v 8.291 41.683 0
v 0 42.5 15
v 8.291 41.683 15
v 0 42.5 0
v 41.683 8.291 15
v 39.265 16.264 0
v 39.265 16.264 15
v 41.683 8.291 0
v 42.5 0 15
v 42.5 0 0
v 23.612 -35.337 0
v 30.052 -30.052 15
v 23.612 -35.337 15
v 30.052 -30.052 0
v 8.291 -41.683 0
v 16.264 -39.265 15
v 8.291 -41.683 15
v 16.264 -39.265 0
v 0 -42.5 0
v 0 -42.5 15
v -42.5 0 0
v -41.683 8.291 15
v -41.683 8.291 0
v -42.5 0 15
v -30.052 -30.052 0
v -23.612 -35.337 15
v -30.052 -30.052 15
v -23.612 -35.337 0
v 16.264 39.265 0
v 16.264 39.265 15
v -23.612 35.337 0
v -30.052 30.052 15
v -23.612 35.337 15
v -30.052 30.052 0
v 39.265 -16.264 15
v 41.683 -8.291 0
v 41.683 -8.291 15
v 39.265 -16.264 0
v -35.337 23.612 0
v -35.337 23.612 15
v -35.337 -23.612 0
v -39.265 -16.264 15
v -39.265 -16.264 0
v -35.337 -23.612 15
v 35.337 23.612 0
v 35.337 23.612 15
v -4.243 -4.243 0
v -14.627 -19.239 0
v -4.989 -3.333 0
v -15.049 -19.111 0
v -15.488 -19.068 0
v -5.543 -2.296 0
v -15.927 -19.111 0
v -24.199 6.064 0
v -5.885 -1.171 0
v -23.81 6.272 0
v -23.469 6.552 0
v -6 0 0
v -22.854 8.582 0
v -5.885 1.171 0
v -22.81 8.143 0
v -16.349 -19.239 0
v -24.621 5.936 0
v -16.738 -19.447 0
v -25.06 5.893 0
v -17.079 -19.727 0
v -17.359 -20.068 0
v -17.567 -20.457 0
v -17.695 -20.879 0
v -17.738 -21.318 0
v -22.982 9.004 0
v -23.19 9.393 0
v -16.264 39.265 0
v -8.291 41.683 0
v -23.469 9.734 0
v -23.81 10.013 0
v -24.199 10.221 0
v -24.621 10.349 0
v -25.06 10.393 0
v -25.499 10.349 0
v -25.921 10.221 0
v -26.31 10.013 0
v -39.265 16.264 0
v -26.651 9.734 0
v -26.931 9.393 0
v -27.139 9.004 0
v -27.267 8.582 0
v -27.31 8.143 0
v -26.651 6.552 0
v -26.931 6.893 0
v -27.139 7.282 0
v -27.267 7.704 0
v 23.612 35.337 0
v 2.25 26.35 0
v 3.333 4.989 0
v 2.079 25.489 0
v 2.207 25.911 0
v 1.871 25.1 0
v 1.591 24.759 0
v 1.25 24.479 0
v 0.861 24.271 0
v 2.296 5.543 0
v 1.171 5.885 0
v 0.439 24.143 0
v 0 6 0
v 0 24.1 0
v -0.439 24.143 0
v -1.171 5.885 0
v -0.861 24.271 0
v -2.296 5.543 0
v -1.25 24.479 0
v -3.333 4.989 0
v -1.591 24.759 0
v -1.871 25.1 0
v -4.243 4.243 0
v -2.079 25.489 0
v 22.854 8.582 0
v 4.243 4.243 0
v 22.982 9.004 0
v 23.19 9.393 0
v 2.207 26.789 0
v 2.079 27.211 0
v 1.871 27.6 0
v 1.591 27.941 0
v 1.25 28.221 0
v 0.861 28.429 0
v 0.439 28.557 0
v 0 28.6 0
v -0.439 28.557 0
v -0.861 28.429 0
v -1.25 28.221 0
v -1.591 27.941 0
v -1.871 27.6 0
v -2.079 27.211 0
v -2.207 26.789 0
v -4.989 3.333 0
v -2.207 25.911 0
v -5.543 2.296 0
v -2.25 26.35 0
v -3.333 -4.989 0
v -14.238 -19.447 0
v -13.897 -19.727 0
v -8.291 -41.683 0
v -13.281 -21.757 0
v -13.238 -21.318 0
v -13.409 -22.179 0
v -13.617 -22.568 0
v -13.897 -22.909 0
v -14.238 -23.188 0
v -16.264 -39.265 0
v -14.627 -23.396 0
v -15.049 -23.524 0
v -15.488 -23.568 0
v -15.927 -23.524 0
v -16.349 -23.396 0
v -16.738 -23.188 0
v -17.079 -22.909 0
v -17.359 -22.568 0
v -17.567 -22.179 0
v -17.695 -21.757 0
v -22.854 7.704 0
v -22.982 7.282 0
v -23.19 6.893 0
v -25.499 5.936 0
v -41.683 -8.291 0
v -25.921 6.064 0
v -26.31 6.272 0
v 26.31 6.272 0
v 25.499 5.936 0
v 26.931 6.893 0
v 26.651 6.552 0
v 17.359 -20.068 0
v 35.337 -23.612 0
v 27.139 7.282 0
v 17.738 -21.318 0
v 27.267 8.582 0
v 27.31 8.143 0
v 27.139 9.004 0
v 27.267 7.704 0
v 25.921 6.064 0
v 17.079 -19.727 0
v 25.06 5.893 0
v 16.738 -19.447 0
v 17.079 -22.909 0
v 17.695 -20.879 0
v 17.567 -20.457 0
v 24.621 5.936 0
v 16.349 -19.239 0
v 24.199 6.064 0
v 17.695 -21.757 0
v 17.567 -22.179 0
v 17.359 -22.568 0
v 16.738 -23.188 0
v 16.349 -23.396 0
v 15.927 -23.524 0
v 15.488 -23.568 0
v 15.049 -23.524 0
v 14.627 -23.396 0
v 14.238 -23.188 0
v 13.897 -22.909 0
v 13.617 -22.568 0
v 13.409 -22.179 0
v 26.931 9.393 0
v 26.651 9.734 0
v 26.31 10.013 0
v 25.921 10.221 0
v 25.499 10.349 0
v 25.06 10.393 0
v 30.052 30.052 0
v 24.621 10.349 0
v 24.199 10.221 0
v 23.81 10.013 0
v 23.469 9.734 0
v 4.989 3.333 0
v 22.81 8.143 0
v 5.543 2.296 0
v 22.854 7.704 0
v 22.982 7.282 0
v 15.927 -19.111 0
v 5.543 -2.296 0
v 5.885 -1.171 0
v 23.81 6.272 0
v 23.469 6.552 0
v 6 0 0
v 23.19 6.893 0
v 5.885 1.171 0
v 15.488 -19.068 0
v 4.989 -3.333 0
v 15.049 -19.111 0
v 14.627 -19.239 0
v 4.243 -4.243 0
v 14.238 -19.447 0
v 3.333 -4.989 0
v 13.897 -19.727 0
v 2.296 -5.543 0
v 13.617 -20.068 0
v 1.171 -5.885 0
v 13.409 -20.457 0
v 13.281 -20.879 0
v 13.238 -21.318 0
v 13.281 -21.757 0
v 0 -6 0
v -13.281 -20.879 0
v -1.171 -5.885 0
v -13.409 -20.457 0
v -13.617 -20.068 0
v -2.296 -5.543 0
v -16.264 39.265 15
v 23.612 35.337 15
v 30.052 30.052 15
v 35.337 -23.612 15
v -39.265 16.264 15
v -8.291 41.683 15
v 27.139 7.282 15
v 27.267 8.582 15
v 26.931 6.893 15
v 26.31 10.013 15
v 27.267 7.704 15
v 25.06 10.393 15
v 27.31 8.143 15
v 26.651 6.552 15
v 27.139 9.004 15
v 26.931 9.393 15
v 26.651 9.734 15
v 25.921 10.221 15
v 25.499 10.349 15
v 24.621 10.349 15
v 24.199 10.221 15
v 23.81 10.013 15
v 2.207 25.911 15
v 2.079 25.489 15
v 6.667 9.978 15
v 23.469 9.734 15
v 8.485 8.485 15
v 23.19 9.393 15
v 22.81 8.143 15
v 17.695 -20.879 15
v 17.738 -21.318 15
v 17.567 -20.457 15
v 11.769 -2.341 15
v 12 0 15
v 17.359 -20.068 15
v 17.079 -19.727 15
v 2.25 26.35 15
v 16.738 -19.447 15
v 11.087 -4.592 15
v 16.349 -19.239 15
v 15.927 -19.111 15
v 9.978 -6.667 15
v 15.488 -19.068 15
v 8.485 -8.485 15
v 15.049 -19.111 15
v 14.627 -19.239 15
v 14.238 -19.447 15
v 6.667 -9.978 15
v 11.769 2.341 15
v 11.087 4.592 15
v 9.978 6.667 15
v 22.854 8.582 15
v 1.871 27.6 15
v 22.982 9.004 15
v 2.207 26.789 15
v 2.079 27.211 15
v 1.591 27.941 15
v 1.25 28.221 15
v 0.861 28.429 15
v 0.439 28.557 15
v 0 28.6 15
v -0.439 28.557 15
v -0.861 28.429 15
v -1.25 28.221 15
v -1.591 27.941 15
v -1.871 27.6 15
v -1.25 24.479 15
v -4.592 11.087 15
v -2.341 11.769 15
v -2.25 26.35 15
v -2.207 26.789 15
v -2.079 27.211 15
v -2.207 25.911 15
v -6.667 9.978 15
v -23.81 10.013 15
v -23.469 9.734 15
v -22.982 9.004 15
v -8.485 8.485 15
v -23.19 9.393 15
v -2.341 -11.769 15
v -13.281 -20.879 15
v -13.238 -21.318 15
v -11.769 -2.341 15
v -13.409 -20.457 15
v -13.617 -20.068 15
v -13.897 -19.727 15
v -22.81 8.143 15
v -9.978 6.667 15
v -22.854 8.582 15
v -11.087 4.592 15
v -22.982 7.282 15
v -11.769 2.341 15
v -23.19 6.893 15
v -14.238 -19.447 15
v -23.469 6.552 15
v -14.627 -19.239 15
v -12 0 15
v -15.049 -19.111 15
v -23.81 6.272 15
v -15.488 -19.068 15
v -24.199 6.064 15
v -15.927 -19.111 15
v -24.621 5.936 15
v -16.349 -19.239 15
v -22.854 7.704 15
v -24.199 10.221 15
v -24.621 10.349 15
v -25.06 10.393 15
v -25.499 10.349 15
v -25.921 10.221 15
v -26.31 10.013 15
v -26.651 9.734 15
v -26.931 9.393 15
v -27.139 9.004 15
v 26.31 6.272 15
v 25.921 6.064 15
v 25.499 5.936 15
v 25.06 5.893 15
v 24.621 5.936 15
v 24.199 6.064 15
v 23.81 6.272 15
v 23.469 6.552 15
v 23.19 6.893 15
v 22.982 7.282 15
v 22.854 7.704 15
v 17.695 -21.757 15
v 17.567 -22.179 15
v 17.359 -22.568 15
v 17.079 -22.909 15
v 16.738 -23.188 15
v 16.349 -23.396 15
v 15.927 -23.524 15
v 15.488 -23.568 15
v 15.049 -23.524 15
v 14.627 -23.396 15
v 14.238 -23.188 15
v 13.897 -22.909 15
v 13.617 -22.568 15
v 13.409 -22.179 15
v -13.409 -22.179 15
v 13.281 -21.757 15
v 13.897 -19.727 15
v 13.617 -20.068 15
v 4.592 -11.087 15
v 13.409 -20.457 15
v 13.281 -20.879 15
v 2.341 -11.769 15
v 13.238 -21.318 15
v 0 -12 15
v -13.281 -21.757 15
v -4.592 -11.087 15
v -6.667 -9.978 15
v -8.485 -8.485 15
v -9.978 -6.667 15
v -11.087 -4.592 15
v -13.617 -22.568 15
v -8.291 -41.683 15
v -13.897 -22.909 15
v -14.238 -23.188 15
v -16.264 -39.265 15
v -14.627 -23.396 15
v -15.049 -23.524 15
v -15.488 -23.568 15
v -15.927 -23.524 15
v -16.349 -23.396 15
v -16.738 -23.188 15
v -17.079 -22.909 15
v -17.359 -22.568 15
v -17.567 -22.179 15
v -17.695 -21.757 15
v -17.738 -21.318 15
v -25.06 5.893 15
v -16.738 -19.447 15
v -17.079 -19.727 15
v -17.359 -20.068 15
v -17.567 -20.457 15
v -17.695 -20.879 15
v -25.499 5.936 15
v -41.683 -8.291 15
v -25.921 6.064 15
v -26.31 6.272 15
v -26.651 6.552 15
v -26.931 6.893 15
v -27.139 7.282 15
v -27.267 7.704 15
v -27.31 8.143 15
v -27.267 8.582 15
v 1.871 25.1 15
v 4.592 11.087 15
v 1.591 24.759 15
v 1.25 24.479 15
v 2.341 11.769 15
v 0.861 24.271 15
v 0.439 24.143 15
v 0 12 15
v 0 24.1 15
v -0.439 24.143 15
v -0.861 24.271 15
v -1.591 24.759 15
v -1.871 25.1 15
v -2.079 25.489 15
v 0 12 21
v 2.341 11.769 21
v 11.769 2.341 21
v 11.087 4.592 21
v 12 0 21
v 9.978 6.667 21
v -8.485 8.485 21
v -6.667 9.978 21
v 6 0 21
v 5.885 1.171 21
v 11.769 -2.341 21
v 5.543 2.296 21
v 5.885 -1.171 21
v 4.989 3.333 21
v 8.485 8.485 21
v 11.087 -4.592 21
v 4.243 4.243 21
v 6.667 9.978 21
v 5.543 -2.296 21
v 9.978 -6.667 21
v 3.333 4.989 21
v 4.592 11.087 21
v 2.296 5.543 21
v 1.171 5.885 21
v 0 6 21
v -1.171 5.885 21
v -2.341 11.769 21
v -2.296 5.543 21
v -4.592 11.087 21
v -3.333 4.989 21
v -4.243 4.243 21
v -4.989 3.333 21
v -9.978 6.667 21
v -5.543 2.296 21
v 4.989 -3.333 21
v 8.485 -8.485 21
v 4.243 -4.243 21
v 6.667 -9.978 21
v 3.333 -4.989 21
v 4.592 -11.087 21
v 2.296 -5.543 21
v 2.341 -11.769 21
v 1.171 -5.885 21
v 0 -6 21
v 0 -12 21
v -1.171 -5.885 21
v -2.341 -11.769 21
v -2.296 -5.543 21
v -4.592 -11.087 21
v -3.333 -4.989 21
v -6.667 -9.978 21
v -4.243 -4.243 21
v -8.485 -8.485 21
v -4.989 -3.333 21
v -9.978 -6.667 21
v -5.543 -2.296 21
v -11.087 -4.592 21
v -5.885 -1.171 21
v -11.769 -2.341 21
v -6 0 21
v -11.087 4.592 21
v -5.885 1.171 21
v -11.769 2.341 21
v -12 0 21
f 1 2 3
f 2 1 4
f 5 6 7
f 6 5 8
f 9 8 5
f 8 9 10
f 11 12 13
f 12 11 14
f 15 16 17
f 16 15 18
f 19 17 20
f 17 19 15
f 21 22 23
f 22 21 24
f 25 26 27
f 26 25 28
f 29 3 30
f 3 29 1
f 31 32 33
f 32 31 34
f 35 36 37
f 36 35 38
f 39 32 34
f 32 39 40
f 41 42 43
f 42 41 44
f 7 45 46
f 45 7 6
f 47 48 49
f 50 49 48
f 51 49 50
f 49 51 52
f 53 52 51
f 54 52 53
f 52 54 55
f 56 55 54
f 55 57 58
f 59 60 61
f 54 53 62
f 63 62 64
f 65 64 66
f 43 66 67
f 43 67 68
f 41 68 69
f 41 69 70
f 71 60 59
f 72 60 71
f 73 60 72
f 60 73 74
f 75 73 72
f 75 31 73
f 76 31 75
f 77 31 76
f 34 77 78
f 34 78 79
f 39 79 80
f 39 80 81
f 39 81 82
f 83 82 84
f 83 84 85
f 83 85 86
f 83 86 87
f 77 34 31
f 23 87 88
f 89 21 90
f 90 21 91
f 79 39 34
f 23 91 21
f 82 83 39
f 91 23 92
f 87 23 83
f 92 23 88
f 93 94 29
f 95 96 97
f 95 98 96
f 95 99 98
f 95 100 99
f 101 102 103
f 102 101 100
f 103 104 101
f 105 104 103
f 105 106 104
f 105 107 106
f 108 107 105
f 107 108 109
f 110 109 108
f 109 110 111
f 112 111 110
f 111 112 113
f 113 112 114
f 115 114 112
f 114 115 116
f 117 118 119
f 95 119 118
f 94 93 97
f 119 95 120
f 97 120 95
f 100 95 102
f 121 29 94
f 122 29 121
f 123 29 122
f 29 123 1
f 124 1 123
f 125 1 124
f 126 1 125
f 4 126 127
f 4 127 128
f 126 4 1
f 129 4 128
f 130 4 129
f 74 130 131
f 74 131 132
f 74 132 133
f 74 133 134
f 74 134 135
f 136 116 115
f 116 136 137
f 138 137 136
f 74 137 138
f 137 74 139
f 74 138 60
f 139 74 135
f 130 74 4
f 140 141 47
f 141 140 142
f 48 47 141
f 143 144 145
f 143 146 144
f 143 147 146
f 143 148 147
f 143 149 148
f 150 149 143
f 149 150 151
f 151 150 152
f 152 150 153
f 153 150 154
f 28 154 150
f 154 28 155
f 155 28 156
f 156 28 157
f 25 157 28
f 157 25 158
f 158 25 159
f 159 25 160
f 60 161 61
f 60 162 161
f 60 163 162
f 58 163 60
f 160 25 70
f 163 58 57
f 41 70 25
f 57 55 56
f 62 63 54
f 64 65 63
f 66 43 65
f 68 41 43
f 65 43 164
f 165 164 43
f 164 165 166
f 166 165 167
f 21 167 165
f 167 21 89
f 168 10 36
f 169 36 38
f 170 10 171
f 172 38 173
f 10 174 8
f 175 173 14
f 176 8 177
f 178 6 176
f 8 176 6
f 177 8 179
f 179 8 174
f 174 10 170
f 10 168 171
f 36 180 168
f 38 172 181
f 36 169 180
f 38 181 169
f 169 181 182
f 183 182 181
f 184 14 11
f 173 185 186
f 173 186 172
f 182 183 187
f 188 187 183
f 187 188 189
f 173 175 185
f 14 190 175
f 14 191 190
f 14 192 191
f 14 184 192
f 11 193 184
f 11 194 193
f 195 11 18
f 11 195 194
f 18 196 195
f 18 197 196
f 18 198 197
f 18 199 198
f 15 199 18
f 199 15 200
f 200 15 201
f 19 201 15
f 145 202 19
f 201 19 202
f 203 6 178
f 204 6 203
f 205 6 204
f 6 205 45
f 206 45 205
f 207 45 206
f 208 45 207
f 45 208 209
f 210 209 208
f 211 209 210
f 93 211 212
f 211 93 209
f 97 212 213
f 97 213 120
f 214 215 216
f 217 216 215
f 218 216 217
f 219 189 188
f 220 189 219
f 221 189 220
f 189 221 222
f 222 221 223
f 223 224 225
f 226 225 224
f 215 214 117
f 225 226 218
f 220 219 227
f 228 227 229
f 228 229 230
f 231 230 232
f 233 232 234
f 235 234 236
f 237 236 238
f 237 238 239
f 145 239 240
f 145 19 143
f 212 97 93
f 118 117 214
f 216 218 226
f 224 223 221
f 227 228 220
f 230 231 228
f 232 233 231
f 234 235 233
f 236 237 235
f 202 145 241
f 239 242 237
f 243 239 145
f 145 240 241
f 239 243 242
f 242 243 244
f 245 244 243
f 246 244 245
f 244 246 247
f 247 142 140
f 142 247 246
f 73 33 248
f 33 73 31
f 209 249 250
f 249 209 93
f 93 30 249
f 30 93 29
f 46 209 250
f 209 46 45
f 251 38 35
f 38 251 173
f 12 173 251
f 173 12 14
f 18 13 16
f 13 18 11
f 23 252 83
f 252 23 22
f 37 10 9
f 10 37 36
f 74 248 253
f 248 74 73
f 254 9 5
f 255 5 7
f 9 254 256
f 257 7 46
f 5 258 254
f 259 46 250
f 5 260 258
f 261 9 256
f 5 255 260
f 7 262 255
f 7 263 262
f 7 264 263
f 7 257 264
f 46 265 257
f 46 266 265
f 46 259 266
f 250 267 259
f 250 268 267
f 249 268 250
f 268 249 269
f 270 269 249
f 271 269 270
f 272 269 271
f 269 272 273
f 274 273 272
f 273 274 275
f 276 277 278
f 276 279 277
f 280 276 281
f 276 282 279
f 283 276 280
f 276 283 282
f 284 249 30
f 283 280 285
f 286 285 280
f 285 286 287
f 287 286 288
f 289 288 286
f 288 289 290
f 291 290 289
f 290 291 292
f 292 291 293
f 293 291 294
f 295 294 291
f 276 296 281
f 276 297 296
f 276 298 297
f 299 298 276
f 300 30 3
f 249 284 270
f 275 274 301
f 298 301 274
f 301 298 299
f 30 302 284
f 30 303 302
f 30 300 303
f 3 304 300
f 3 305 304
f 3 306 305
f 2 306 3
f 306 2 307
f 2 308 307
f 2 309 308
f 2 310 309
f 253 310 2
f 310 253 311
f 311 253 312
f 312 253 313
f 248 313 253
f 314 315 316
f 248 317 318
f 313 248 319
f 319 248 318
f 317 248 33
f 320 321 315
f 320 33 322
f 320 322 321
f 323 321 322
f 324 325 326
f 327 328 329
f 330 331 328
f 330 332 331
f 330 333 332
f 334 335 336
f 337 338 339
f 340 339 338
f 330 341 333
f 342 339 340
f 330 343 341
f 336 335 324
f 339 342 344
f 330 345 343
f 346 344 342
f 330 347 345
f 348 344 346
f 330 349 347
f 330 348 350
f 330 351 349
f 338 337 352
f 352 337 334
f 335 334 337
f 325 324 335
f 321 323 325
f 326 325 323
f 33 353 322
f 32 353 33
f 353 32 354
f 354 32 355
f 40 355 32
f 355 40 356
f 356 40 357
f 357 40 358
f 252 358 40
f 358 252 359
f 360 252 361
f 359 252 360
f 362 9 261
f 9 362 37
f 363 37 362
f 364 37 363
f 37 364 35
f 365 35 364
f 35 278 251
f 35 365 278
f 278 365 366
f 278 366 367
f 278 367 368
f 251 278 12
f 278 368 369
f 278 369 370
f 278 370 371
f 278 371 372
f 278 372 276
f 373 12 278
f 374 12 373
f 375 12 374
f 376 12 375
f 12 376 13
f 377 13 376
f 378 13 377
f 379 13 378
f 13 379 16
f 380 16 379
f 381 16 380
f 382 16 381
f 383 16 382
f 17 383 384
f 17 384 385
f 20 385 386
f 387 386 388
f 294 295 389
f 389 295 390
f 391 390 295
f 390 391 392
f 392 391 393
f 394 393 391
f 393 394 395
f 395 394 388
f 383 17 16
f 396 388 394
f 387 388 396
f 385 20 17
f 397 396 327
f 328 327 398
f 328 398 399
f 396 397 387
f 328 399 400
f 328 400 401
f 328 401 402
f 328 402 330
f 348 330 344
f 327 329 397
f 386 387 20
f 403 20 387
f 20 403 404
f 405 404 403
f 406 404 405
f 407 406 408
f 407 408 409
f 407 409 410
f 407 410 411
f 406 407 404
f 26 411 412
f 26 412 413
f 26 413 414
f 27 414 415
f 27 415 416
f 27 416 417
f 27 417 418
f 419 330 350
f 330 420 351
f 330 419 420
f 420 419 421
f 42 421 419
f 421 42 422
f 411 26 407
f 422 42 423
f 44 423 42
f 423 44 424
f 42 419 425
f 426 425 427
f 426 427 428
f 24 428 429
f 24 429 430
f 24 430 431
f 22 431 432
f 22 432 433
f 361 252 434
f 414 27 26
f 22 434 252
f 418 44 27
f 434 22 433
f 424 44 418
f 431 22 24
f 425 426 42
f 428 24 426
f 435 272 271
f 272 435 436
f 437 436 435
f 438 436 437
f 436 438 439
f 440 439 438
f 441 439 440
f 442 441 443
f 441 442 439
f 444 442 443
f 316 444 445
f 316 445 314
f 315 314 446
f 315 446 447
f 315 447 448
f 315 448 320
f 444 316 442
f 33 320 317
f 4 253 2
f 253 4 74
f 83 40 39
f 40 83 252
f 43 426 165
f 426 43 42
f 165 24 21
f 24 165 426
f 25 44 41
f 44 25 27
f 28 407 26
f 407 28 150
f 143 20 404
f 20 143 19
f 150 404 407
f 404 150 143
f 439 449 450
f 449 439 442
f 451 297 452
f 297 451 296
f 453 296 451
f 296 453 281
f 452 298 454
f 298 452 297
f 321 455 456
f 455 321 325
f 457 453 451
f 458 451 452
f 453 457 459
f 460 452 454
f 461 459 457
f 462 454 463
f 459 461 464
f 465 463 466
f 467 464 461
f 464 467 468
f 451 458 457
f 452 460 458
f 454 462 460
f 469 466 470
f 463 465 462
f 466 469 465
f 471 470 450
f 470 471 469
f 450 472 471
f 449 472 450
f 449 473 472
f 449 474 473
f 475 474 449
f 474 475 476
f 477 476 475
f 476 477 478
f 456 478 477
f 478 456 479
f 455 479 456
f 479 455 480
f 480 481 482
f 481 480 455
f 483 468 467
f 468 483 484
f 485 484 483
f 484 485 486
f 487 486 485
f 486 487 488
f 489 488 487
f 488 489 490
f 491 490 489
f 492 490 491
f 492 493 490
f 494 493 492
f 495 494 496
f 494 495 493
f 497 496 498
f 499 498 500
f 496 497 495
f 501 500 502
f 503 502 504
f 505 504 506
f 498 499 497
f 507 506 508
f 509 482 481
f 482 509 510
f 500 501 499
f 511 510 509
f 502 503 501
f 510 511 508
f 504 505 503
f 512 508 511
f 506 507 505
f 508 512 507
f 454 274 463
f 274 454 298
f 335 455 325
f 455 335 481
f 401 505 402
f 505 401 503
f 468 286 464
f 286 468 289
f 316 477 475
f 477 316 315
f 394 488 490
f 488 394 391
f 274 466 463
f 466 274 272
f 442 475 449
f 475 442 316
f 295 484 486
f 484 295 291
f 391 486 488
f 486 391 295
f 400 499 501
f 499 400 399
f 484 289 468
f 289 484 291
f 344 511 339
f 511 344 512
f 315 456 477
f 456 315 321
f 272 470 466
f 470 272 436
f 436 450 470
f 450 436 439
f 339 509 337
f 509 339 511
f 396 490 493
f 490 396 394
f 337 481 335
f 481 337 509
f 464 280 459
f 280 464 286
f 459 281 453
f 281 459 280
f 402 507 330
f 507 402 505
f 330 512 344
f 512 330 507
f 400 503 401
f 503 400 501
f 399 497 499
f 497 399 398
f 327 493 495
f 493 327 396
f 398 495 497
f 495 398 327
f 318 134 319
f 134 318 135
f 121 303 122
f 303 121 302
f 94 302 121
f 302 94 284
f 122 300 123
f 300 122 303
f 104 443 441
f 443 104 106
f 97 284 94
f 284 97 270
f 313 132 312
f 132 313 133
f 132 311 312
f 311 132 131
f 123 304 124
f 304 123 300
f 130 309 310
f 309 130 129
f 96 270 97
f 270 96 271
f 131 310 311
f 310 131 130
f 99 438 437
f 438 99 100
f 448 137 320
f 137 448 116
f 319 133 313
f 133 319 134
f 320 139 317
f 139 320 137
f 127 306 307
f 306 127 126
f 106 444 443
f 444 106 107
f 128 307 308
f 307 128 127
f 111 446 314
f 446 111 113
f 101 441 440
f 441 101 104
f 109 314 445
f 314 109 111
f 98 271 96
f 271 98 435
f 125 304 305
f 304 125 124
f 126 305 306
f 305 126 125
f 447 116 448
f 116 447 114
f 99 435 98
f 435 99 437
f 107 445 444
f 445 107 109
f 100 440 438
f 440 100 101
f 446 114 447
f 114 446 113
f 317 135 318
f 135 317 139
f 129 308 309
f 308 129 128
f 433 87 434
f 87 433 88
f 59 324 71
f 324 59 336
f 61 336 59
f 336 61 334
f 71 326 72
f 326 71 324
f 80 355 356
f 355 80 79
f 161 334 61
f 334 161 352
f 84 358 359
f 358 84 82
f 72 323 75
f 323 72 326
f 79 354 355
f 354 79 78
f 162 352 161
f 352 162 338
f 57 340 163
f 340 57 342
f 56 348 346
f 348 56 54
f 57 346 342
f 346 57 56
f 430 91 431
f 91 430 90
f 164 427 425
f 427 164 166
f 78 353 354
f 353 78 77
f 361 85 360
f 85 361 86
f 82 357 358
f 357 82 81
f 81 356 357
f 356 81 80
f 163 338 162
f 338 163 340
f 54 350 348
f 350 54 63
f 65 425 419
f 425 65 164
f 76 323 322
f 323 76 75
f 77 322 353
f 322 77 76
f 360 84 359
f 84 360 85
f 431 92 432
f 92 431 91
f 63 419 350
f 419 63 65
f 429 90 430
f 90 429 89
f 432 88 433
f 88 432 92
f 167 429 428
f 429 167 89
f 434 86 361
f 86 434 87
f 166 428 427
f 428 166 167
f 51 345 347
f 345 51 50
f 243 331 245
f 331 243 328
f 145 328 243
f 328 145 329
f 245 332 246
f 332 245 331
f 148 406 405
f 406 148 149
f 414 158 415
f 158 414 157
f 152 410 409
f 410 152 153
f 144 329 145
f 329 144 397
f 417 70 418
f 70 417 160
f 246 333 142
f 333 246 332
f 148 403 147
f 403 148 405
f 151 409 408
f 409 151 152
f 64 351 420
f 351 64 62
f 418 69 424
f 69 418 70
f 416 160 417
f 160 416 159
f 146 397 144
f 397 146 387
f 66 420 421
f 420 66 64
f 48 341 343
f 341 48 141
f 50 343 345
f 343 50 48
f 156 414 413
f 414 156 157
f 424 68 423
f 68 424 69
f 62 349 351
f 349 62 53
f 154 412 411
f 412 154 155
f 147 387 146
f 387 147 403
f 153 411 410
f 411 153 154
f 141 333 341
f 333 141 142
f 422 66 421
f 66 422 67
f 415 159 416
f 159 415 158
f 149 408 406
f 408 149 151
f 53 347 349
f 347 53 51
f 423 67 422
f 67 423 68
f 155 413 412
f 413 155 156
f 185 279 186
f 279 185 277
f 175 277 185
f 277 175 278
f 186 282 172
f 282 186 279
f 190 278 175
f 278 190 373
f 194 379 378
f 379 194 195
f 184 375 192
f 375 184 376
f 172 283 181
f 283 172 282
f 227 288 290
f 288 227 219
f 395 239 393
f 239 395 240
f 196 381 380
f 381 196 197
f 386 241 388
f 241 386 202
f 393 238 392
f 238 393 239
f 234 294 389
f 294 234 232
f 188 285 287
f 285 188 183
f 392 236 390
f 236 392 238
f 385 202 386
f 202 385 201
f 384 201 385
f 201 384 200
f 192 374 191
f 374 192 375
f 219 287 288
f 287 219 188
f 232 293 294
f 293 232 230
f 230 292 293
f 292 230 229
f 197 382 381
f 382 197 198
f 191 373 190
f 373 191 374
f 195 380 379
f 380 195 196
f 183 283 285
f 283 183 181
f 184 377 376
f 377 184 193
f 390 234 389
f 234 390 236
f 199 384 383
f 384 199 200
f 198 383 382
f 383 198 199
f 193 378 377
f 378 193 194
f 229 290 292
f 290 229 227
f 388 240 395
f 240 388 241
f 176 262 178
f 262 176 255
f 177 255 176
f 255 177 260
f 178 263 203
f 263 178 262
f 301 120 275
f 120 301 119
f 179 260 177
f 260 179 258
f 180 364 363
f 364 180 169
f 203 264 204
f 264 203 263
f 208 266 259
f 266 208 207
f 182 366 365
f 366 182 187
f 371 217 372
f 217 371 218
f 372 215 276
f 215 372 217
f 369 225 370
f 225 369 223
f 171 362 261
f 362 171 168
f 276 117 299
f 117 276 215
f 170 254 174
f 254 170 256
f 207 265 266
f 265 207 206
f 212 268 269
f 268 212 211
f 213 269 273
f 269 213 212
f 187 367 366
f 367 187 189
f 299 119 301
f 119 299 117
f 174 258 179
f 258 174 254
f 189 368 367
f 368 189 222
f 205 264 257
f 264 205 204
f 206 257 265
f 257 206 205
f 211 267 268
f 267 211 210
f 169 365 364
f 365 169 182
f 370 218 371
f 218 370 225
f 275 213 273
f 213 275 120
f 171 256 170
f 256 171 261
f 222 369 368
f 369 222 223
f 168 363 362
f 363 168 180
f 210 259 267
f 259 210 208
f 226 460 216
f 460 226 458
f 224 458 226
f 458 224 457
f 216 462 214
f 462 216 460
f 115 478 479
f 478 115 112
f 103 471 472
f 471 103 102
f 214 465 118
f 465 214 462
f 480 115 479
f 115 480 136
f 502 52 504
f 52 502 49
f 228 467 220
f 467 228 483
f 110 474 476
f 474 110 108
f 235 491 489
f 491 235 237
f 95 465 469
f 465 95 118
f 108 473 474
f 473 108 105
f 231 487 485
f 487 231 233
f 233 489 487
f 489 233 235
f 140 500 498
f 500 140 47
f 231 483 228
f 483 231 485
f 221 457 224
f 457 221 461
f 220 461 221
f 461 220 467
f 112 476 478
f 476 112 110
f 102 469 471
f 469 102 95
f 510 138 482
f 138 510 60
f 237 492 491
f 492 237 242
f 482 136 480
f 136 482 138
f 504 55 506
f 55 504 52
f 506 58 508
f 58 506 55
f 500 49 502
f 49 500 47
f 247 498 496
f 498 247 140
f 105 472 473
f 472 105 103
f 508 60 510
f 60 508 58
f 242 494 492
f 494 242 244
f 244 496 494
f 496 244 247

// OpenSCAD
$fn = 32;

// ----------------------------------------------------------------------
// Flange Ø85 x 15
// 5 holes on a Ø52.7 bolt circle, bolted joints
// ----------------------------------------------------------------------

// --- parameters (mm) ---
flange_d = 85;   // outside diameter of the flange
thickness = 15;  // flange thickness
holes = 5;       // number of bolt holes
pcd = 52.7;      // bolt circle diameter
start_deg = 90;  // angle of the first hole, from +X
hole_d = 4.5;    // bolt hole diameter
bore_d = 12;     // central through bore
hub_d = 24;      // hub outside diameter
hub_h = 6;       // hub height above the flange face (0 = no hub)

// --- derived feature positions (mm) ---
height = thickness + hub_h;  // = 21   overall height of the part
pcd_r = pcd / 2;             // = 26.35   bolt circle radius
hole_step = 360 / holes;     // = 72   angular pitch
feature_centers = [
  [pcd_r * cos(start_deg + 0 * hole_step), pcd_r * sin(start_deg + 0 * hole_step)],
  [pcd_r * cos(start_deg + 1 * hole_step), pcd_r * sin(start_deg + 1 * hole_step)],
  [pcd_r * cos(start_deg + 2 * hole_step), pcd_r * sin(start_deg + 2 * hole_step)],
  [pcd_r * cos(start_deg + 3 * hole_step), pcd_r * sin(start_deg + 3 * hole_step)],
  [pcd_r * cos(start_deg + 4 * hole_step), pcd_r * sin(start_deg + 4 * hole_step)]
];   // bolt hole centres on the pitch circle

// flange disc, every hole and the bore cut straight through
difference() {
  union() {
    cylinder(d = flange_d, h = thickness);
    cylinder(d = hub_d, h = height);  // hub, overlapped into the flange
  }
  translate([0, 0, -1]) cylinder(d = bore_d, h = height + 2);  // bore, through
  for (centre = feature_centers)
    translate([centre[0], centre[1], -1]) cylinder(d = hole_d, h = thickness + 2);
}
